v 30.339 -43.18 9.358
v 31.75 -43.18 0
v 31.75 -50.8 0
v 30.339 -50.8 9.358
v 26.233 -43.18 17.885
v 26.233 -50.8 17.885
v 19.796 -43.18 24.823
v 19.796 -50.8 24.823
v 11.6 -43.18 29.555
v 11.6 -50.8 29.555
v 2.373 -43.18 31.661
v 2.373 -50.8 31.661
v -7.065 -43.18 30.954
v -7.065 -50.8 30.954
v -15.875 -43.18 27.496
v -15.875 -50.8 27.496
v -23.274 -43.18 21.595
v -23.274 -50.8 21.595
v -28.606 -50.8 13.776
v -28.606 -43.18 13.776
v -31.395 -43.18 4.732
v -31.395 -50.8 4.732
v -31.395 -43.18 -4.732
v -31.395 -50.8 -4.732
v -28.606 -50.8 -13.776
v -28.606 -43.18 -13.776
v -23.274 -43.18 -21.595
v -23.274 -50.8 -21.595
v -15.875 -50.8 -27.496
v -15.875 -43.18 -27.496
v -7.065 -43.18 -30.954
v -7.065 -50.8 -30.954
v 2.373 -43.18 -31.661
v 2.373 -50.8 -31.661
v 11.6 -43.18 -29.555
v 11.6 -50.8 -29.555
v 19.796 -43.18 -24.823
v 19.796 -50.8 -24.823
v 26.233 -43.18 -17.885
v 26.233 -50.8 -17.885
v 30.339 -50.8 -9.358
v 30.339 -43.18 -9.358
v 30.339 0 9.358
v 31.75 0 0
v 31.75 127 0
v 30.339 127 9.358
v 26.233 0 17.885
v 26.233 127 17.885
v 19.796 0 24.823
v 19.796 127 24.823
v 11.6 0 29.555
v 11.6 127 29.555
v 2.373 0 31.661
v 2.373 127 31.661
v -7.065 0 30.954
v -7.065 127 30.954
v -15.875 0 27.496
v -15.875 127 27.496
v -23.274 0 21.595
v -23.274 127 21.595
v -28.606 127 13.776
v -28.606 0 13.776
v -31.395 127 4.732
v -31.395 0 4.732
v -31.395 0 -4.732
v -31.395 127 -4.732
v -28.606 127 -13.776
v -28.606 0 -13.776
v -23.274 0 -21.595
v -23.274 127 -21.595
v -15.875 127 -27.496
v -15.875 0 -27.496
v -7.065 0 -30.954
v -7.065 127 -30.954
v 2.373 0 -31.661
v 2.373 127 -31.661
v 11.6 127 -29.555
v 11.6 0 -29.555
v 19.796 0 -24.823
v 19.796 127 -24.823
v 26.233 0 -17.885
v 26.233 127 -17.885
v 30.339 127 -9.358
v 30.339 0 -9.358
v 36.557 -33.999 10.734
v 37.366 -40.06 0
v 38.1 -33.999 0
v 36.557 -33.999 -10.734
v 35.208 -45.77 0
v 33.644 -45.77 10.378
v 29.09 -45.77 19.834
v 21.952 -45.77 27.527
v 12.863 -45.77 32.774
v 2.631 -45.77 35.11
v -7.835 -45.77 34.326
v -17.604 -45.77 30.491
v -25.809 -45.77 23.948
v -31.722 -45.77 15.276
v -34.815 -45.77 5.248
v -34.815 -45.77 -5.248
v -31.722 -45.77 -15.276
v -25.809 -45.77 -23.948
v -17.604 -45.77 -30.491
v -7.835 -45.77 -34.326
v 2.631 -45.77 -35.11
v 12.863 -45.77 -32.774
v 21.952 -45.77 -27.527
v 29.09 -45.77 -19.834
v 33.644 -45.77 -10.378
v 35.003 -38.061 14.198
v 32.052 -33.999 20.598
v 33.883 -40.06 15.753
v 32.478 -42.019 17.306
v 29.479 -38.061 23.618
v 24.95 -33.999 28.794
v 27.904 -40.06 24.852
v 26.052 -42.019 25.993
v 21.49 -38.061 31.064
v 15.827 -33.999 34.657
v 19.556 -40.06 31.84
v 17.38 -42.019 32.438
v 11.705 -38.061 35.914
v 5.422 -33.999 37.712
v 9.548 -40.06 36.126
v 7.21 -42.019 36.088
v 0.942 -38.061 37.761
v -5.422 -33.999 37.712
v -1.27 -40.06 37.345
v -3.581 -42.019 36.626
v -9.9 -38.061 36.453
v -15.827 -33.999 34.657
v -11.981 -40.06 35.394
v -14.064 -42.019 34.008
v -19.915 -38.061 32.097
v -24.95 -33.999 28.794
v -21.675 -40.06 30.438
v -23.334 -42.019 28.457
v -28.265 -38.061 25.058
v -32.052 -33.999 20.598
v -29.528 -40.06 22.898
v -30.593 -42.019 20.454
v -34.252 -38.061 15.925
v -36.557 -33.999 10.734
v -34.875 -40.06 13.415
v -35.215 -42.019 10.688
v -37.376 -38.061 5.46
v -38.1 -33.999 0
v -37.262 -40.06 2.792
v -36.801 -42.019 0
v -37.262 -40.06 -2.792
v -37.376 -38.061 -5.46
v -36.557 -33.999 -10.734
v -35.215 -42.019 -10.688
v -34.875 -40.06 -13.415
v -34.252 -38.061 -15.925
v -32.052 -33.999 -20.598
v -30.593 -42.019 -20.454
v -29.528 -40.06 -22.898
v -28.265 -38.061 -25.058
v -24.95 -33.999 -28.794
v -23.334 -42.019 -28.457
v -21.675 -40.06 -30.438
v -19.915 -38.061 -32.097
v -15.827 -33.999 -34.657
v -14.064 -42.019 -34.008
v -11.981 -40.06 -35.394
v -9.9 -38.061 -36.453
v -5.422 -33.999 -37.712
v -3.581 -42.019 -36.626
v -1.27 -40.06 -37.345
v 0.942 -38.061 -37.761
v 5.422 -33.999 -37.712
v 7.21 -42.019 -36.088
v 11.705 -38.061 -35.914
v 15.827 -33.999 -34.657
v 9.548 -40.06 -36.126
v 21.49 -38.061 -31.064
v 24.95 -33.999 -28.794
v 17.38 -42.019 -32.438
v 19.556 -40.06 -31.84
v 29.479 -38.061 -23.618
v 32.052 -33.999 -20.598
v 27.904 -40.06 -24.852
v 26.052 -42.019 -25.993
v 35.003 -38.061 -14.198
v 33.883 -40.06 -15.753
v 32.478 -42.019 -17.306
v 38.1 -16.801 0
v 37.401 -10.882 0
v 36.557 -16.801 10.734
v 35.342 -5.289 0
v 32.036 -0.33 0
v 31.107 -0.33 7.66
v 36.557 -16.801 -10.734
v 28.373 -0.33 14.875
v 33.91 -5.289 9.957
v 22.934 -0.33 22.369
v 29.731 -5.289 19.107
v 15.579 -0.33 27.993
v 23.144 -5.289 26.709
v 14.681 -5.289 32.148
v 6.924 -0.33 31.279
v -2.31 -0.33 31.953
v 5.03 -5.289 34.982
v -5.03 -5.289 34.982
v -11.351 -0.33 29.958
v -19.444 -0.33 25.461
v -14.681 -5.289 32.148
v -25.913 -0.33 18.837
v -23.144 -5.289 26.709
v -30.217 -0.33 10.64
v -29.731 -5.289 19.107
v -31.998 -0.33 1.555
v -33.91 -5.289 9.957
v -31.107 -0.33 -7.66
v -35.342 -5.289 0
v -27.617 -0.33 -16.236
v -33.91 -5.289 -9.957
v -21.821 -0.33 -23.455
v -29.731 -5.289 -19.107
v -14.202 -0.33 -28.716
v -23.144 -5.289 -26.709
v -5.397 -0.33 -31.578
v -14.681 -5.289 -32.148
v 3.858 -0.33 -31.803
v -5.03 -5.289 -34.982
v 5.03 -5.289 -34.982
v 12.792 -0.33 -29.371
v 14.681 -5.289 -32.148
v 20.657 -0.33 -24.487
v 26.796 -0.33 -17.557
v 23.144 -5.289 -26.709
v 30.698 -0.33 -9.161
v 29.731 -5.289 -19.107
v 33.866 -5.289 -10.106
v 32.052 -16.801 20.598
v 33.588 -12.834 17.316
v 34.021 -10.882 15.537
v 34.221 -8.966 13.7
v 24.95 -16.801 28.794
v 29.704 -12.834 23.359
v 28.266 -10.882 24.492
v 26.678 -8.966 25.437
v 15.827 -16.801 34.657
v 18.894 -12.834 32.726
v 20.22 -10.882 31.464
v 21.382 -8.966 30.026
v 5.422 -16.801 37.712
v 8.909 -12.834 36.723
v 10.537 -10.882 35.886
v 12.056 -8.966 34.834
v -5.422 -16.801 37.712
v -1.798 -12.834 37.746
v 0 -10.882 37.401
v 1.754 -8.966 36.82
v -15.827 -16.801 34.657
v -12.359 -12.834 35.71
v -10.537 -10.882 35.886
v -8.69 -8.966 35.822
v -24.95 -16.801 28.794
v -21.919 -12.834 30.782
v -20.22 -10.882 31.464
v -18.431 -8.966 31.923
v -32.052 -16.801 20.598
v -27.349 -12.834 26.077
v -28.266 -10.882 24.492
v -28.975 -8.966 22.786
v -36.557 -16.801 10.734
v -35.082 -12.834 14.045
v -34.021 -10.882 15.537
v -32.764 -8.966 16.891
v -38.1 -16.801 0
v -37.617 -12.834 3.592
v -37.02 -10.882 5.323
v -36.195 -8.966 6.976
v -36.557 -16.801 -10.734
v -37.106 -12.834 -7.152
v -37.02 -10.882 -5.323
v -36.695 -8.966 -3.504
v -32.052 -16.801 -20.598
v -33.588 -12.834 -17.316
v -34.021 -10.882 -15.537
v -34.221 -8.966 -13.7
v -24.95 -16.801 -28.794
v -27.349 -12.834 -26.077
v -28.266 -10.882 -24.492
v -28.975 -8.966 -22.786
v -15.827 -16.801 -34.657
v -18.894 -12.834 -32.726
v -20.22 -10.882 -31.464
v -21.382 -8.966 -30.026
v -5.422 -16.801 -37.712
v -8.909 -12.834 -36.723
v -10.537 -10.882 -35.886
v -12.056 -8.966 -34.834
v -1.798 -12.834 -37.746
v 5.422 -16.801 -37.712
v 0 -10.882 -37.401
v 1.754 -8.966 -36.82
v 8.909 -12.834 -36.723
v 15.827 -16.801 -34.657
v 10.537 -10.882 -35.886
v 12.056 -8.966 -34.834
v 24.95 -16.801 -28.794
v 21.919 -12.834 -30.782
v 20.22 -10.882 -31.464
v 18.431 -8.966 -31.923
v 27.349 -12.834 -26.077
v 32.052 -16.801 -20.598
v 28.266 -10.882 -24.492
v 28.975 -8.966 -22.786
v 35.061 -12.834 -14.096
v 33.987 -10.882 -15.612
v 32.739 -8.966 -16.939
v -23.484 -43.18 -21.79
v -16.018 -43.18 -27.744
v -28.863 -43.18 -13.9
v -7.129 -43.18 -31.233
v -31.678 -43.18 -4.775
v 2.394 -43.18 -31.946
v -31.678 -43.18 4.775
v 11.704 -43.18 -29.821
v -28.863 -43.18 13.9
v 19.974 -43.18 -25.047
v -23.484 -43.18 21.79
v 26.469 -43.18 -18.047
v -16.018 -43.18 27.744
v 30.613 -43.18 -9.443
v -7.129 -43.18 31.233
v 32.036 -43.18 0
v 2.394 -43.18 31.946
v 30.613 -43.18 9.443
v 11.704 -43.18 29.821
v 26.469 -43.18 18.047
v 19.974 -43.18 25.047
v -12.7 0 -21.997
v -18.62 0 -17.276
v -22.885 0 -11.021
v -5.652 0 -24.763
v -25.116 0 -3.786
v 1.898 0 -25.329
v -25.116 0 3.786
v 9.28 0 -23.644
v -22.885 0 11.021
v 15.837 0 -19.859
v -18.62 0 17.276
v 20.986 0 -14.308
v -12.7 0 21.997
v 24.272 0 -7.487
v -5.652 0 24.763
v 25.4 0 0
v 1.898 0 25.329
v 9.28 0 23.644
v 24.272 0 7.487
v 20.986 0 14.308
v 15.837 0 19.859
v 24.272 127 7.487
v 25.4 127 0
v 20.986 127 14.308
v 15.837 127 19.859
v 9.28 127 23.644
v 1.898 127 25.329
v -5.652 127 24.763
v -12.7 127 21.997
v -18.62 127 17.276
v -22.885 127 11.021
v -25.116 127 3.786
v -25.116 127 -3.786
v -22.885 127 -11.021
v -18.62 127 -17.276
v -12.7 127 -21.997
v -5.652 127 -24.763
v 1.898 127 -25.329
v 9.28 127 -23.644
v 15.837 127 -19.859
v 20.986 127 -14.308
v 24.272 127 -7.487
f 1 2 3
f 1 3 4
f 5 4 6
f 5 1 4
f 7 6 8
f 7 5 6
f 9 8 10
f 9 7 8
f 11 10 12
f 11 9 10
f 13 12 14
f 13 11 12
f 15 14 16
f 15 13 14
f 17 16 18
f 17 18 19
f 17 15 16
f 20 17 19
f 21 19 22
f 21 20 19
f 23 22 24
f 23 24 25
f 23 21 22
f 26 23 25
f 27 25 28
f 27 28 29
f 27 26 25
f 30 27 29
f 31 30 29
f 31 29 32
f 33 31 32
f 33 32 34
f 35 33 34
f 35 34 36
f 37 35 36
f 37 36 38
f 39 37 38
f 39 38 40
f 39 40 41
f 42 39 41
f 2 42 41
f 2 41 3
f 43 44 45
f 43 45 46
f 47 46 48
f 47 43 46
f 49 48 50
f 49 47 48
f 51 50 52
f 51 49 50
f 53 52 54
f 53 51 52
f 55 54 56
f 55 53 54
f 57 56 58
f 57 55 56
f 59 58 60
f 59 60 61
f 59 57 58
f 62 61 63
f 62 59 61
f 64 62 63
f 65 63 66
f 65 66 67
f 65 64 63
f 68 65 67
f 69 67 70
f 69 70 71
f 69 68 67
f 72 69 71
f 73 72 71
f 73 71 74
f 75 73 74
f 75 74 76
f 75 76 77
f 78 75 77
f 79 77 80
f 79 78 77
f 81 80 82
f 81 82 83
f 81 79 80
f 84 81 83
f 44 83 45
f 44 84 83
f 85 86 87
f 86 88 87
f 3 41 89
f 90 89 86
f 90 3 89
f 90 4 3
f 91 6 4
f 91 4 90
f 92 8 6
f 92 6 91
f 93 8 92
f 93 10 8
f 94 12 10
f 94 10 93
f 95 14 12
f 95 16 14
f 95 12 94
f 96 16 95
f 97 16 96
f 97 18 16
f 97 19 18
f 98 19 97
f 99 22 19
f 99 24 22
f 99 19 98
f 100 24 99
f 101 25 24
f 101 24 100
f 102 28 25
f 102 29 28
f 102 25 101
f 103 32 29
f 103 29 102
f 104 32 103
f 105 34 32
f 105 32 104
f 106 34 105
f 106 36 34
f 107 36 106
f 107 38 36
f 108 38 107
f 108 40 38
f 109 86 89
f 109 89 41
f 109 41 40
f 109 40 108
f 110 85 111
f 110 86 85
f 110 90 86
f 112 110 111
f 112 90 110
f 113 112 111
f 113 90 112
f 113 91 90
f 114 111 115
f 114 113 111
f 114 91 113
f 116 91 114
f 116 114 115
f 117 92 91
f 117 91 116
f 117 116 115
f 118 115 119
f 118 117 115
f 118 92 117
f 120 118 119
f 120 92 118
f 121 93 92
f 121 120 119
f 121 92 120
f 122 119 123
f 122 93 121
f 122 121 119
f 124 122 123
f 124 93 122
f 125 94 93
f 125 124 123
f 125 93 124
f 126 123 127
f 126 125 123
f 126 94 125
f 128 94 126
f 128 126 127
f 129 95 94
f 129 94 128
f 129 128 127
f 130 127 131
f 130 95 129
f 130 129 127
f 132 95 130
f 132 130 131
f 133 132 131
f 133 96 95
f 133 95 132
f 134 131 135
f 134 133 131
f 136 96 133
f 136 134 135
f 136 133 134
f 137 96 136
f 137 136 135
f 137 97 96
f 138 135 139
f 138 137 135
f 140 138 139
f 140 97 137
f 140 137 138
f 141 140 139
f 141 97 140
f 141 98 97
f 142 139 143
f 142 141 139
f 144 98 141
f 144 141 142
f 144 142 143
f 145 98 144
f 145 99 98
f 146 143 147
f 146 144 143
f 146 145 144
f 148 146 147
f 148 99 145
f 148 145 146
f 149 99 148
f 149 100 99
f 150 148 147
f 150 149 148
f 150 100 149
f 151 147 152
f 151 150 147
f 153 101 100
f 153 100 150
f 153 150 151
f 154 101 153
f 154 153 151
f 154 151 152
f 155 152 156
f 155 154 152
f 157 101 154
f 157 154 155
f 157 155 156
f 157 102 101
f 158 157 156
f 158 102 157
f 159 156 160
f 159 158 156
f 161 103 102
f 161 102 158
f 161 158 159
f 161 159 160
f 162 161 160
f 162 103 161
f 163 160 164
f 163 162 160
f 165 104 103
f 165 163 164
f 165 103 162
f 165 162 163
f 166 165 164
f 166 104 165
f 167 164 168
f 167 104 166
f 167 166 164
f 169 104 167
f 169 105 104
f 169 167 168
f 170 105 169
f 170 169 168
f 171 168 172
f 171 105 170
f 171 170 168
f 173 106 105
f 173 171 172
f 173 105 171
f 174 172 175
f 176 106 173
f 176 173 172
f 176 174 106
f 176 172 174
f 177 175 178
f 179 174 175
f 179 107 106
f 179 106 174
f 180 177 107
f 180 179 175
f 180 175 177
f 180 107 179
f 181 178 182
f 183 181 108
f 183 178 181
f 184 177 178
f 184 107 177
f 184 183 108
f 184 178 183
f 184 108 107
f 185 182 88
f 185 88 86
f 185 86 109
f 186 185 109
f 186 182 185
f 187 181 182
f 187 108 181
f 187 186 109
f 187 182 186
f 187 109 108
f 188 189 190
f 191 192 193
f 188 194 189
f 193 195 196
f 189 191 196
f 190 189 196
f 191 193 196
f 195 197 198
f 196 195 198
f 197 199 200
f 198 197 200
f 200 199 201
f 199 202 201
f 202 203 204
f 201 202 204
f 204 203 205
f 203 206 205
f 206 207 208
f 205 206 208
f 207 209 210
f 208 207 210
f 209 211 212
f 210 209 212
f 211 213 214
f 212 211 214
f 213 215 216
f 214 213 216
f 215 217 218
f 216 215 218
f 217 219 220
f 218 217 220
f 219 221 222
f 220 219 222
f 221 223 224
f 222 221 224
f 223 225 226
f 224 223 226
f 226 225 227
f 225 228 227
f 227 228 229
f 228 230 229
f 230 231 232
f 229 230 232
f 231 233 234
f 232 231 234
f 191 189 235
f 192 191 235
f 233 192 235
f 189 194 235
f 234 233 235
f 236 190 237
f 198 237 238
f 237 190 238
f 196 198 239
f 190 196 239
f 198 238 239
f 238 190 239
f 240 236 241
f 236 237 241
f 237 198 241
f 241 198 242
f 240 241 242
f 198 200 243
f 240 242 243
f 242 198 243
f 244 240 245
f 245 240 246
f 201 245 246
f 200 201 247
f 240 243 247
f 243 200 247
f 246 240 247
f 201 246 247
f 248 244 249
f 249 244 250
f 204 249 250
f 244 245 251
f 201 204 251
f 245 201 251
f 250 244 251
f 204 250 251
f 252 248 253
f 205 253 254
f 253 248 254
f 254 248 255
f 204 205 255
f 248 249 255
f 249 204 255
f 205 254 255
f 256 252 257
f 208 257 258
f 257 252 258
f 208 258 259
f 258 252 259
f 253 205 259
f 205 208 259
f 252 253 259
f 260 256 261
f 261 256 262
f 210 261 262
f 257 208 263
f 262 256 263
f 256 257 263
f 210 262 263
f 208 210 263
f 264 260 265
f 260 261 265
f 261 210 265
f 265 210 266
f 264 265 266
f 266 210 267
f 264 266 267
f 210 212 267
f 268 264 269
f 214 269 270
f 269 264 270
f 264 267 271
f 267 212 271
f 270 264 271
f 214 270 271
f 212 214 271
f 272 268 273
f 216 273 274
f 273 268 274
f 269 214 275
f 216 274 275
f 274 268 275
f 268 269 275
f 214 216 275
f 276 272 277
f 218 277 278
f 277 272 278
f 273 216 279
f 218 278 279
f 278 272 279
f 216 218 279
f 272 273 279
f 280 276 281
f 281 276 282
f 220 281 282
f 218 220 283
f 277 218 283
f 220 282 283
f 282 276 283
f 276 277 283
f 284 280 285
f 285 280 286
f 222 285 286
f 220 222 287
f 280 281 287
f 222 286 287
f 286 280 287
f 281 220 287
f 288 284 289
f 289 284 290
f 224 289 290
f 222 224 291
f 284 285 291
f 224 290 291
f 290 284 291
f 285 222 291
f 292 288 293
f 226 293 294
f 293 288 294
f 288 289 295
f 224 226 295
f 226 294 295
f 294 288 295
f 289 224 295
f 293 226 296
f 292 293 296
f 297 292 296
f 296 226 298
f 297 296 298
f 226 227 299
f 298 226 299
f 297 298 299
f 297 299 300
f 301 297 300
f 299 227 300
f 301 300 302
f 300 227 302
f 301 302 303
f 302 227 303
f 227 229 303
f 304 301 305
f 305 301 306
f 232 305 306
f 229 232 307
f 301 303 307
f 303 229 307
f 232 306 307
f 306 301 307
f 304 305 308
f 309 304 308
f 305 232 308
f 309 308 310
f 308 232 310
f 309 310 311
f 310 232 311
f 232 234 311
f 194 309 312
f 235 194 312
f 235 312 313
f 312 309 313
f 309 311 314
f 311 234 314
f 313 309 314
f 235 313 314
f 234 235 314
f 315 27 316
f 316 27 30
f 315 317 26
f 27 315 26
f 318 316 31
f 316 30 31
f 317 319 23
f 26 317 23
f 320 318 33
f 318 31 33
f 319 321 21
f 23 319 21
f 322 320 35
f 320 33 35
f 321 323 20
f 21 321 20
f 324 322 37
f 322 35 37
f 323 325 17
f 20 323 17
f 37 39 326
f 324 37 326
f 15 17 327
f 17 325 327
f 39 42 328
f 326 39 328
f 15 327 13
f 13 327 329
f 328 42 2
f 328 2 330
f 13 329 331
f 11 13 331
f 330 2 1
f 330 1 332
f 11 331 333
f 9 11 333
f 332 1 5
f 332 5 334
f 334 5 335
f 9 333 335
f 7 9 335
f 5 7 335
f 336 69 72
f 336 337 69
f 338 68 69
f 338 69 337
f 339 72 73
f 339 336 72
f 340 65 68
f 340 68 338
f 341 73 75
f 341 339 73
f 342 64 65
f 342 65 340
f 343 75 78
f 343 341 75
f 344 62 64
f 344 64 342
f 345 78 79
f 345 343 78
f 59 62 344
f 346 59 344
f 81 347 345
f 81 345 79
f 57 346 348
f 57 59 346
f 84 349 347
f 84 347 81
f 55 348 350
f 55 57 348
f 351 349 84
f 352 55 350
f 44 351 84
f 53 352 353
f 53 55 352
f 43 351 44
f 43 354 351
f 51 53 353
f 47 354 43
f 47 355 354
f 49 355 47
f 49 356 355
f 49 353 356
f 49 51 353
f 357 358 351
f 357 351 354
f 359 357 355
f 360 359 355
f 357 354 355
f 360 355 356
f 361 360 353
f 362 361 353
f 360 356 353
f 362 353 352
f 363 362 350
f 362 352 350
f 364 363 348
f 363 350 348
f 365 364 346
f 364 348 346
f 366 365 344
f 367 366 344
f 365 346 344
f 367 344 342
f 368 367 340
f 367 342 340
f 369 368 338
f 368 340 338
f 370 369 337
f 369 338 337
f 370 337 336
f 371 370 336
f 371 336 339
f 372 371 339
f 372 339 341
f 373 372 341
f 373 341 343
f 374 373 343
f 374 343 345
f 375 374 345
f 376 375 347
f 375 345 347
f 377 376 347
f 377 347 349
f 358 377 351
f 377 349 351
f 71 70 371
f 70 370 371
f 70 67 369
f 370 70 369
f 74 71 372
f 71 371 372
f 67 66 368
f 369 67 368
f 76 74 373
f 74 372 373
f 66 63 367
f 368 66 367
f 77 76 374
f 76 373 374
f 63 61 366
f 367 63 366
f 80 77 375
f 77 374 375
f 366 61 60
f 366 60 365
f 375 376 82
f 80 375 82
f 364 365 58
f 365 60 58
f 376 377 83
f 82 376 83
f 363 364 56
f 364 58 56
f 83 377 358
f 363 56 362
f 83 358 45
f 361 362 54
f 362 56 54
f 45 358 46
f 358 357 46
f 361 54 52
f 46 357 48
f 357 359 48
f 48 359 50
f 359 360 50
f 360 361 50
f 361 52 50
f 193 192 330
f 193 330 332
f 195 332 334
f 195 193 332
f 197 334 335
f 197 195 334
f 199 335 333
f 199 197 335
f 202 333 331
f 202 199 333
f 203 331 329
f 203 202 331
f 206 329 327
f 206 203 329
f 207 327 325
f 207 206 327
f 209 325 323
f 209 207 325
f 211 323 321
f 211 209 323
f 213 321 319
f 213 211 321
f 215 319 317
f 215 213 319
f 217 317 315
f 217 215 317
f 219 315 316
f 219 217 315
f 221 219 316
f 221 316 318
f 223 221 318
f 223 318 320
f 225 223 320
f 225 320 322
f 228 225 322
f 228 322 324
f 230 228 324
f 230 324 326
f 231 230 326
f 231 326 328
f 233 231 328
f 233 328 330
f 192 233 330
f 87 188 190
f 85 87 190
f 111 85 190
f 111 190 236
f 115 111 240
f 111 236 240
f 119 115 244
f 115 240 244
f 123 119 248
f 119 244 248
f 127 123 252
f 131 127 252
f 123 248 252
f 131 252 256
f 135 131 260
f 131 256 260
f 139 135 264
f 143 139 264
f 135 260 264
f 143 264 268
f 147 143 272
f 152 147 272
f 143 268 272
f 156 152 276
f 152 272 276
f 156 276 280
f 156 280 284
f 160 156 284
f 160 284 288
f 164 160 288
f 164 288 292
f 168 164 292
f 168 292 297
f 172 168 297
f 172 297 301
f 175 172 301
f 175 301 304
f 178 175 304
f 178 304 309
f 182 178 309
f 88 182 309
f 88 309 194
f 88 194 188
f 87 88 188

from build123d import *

# Parameters (mm, degrees)
F0_R     = 38.1
F0_R_2   = 31.75
F1_DEPTH = 50.8
F4_R     = 32.0360083413
F5_DEPTH = 43.18
F6_R     = 31.75
F6_R_2   = 25.4
F7_DEPTH = 127


# Not quite as in the source:
# - a fillet or chamfer that OpenCascade refuses, or shapes differently, is made with other operations: its cross-section is extruded or revolved along the edge and cut away or added


with BuildPart() as f1:
    # F0 (on Front) → F1 (new body)
    with BuildSketch(Plane.XZ):
        Circle(F0_R)
        Circle(F0_R_2, mode=Mode.SUBTRACT)
    extrude(amount=F1_DEPTH)

    # F2: fillet of radius 25.4 on 1 edges, made by hand

    # F2_s1 → F2_t2 (revolve, cut)
    with BuildSketch(Plane.XY):
        with BuildLine():
            ThreePointArc((38.1, -33.9994791747), (36.459524406, -42.9797352958), (31.75, -50.8))
            Line((31.75, -50.8), (38.1, -50.8))
            Line((38.1, -50.8), (38.1, -33.9994791747))
        make_face()
    revolve(axis=Axis((0, -50.8, 0), (0, -1, 0)), mode=Mode.SUBTRACT)

    # F3: fillet of radius 25.4 on 1 edges, made by hand

    # F3_s1 → F3_t2 (revolve, cut)
    with BuildSketch(Plane.XY):
        with BuildLine():
            ThreePointArc((38.1, -16.8005208253), (36.459524406, -7.8202647042), (31.75, 0))
            Line((31.75, 0), (38.1, 0))
            Line((38.1, 0), (38.1, -16.8005208253))
        make_face()
    revolve(axis=Axis((0, 0, 0), (0, -1, 0)), mode=Mode.SUBTRACT)

    # F4 (on Front) → F5 (cut)
    with BuildSketch(Plane.XZ):
        Circle(F4_R)
    extrude(amount=F5_DEPTH, mode=Mode.SUBTRACT)


with BuildPart() as f7:
    # F6 (on Front) → F7 (new body)
    with BuildSketch(Plane.XZ):
        Circle(F6_R)
        Circle(F6_R_2, mode=Mode.SUBTRACT)
    extrude(amount=-F7_DEPTH)


solid = Compound([f1.part, f7.part])
